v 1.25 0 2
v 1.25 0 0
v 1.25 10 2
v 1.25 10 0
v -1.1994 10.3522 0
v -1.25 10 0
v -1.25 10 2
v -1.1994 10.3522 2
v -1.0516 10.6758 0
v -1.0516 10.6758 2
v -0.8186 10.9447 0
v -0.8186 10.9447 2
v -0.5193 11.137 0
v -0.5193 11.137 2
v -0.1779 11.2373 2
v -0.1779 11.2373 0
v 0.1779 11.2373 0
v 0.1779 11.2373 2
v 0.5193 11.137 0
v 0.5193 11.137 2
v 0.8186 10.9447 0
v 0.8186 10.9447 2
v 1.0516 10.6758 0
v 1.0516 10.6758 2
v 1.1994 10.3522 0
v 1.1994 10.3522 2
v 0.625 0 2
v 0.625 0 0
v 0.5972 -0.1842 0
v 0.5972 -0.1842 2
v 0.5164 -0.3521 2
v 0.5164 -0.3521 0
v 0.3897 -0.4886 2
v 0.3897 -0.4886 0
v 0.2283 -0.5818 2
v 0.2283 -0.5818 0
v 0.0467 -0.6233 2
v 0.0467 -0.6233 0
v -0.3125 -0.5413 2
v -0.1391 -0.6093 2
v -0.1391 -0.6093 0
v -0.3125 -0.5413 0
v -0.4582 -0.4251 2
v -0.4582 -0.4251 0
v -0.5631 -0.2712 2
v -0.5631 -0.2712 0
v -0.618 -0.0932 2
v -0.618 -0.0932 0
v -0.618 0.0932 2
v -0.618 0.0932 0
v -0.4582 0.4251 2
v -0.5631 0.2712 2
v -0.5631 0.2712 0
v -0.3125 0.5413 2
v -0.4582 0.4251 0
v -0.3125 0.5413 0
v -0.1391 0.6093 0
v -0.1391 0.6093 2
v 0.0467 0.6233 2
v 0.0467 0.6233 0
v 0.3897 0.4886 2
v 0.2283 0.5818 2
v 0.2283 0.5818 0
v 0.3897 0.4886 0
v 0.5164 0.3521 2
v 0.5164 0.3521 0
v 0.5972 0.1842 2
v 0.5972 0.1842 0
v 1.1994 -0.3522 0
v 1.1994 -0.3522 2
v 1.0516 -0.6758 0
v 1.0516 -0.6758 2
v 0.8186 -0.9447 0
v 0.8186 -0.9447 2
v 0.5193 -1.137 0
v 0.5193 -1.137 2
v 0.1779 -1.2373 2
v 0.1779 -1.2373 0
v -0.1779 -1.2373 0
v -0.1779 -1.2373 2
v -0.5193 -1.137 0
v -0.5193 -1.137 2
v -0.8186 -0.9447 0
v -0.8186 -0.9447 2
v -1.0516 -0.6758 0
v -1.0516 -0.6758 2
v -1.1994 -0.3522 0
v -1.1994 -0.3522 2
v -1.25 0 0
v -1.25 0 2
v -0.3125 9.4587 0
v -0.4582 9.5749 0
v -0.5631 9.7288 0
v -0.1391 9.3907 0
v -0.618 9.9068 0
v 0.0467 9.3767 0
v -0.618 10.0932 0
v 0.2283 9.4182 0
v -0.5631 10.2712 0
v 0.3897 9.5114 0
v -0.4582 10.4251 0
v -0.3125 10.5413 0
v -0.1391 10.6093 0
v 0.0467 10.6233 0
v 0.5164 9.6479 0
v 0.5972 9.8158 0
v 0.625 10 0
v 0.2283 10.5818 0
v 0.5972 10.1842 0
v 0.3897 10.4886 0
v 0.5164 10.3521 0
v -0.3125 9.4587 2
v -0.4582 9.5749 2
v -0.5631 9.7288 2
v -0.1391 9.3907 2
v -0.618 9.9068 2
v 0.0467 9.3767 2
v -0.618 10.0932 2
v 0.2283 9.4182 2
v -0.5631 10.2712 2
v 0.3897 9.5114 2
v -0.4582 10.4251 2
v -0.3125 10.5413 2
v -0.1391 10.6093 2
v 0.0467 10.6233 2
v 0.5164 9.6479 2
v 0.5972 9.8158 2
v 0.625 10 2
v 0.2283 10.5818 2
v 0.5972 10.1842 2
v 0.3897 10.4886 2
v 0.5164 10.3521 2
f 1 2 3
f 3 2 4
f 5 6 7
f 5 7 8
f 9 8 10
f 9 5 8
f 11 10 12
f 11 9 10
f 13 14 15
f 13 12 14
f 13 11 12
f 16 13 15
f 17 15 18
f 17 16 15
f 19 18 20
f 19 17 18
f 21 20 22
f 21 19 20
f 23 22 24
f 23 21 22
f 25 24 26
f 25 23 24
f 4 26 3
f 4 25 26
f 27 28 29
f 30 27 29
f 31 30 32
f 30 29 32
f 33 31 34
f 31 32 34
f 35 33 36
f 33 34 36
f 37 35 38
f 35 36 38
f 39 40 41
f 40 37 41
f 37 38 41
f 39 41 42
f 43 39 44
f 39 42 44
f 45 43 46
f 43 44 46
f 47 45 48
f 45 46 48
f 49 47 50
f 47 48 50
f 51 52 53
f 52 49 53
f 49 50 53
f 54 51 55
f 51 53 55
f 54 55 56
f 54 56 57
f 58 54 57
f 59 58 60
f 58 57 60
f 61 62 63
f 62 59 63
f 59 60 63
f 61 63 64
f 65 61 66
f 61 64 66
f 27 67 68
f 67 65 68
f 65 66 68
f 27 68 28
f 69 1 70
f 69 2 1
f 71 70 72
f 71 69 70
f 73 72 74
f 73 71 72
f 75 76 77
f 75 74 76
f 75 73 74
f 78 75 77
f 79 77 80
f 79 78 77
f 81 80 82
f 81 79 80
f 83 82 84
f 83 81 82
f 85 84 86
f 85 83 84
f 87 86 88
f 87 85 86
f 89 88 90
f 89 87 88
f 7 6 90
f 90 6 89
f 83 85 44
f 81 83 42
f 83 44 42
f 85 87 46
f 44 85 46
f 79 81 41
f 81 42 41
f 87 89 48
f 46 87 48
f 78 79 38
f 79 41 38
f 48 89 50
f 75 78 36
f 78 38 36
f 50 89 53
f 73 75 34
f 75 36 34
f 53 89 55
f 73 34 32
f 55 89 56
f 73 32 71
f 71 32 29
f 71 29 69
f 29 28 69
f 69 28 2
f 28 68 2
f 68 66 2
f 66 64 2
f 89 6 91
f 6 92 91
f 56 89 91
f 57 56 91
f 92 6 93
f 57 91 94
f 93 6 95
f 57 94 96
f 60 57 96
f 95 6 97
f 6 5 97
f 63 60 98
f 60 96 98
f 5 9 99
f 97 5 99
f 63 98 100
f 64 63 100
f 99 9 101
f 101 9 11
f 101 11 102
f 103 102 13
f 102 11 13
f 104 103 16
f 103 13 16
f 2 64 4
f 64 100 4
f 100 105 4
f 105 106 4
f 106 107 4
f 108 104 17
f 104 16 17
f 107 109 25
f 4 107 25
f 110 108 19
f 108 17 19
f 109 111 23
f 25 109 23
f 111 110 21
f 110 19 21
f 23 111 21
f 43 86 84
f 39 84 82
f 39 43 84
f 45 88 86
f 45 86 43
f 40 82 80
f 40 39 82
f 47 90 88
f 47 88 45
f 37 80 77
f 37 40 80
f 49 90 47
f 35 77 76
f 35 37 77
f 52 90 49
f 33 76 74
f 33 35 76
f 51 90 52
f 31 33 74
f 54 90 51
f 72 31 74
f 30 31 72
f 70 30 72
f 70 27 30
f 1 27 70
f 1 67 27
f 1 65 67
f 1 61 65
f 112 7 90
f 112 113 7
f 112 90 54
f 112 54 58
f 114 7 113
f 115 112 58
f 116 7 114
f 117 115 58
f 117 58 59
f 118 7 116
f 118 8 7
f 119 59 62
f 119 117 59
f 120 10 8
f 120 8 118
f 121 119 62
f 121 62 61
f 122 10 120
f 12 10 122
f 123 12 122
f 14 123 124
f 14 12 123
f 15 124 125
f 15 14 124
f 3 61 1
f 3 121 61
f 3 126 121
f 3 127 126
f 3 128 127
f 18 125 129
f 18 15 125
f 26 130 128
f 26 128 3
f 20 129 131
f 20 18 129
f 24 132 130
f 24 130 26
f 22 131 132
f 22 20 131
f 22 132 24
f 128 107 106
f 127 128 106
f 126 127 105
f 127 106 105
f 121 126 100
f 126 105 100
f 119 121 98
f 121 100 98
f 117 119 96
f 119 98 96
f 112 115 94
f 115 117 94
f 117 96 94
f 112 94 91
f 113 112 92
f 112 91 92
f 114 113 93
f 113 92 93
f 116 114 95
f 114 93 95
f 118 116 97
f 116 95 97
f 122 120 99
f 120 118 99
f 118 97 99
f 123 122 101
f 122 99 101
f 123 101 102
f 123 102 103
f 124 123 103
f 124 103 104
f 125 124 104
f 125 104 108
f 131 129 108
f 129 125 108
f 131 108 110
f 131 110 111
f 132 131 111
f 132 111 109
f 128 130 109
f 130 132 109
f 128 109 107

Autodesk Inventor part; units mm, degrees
ref_plane "YZ Plane" through (0, 0, 0) normal (1, 0, 0) x (0, 1, 0)
ref_plane "XZ Plane" through (0, 0, 0) normal (0, 1, 0) x (-1, 0, 0)
ref_plane "XY Plane" through (0, 0, 0) normal (0, 0, 1) x (1, 0, 0)
sketch "草圖1" plane through (0, 0, 0) normal (0, 0, 1) x (1, 0, 0)
  line L0 (0, 0) -> (0, 10) construction
  line L1 (1.25, 0) -> (1.25, 10)
  line L2 (-1.25, 10) -> (-1.25, 0)
  arc A0 (-1.25, 0) -> (1.25, 0) centre (0, 0) ccw
  arc A1 (1.25, 10) -> (-1.25, 10) centre (0, 10) ccw
  circle A2 centre (0, 10) radius 0.625
  circle A3 centre (0, 0) radius 0.625
  point P0 (0, 5)
  dimension "d0" = 10
  dimension "d1" = 2.5
  dimension "d2" = 1.25
  dimension "d3" = 1.25
extrude "擠出1" add sketch "草圖1" along normal blind 2
properties part number "3"
